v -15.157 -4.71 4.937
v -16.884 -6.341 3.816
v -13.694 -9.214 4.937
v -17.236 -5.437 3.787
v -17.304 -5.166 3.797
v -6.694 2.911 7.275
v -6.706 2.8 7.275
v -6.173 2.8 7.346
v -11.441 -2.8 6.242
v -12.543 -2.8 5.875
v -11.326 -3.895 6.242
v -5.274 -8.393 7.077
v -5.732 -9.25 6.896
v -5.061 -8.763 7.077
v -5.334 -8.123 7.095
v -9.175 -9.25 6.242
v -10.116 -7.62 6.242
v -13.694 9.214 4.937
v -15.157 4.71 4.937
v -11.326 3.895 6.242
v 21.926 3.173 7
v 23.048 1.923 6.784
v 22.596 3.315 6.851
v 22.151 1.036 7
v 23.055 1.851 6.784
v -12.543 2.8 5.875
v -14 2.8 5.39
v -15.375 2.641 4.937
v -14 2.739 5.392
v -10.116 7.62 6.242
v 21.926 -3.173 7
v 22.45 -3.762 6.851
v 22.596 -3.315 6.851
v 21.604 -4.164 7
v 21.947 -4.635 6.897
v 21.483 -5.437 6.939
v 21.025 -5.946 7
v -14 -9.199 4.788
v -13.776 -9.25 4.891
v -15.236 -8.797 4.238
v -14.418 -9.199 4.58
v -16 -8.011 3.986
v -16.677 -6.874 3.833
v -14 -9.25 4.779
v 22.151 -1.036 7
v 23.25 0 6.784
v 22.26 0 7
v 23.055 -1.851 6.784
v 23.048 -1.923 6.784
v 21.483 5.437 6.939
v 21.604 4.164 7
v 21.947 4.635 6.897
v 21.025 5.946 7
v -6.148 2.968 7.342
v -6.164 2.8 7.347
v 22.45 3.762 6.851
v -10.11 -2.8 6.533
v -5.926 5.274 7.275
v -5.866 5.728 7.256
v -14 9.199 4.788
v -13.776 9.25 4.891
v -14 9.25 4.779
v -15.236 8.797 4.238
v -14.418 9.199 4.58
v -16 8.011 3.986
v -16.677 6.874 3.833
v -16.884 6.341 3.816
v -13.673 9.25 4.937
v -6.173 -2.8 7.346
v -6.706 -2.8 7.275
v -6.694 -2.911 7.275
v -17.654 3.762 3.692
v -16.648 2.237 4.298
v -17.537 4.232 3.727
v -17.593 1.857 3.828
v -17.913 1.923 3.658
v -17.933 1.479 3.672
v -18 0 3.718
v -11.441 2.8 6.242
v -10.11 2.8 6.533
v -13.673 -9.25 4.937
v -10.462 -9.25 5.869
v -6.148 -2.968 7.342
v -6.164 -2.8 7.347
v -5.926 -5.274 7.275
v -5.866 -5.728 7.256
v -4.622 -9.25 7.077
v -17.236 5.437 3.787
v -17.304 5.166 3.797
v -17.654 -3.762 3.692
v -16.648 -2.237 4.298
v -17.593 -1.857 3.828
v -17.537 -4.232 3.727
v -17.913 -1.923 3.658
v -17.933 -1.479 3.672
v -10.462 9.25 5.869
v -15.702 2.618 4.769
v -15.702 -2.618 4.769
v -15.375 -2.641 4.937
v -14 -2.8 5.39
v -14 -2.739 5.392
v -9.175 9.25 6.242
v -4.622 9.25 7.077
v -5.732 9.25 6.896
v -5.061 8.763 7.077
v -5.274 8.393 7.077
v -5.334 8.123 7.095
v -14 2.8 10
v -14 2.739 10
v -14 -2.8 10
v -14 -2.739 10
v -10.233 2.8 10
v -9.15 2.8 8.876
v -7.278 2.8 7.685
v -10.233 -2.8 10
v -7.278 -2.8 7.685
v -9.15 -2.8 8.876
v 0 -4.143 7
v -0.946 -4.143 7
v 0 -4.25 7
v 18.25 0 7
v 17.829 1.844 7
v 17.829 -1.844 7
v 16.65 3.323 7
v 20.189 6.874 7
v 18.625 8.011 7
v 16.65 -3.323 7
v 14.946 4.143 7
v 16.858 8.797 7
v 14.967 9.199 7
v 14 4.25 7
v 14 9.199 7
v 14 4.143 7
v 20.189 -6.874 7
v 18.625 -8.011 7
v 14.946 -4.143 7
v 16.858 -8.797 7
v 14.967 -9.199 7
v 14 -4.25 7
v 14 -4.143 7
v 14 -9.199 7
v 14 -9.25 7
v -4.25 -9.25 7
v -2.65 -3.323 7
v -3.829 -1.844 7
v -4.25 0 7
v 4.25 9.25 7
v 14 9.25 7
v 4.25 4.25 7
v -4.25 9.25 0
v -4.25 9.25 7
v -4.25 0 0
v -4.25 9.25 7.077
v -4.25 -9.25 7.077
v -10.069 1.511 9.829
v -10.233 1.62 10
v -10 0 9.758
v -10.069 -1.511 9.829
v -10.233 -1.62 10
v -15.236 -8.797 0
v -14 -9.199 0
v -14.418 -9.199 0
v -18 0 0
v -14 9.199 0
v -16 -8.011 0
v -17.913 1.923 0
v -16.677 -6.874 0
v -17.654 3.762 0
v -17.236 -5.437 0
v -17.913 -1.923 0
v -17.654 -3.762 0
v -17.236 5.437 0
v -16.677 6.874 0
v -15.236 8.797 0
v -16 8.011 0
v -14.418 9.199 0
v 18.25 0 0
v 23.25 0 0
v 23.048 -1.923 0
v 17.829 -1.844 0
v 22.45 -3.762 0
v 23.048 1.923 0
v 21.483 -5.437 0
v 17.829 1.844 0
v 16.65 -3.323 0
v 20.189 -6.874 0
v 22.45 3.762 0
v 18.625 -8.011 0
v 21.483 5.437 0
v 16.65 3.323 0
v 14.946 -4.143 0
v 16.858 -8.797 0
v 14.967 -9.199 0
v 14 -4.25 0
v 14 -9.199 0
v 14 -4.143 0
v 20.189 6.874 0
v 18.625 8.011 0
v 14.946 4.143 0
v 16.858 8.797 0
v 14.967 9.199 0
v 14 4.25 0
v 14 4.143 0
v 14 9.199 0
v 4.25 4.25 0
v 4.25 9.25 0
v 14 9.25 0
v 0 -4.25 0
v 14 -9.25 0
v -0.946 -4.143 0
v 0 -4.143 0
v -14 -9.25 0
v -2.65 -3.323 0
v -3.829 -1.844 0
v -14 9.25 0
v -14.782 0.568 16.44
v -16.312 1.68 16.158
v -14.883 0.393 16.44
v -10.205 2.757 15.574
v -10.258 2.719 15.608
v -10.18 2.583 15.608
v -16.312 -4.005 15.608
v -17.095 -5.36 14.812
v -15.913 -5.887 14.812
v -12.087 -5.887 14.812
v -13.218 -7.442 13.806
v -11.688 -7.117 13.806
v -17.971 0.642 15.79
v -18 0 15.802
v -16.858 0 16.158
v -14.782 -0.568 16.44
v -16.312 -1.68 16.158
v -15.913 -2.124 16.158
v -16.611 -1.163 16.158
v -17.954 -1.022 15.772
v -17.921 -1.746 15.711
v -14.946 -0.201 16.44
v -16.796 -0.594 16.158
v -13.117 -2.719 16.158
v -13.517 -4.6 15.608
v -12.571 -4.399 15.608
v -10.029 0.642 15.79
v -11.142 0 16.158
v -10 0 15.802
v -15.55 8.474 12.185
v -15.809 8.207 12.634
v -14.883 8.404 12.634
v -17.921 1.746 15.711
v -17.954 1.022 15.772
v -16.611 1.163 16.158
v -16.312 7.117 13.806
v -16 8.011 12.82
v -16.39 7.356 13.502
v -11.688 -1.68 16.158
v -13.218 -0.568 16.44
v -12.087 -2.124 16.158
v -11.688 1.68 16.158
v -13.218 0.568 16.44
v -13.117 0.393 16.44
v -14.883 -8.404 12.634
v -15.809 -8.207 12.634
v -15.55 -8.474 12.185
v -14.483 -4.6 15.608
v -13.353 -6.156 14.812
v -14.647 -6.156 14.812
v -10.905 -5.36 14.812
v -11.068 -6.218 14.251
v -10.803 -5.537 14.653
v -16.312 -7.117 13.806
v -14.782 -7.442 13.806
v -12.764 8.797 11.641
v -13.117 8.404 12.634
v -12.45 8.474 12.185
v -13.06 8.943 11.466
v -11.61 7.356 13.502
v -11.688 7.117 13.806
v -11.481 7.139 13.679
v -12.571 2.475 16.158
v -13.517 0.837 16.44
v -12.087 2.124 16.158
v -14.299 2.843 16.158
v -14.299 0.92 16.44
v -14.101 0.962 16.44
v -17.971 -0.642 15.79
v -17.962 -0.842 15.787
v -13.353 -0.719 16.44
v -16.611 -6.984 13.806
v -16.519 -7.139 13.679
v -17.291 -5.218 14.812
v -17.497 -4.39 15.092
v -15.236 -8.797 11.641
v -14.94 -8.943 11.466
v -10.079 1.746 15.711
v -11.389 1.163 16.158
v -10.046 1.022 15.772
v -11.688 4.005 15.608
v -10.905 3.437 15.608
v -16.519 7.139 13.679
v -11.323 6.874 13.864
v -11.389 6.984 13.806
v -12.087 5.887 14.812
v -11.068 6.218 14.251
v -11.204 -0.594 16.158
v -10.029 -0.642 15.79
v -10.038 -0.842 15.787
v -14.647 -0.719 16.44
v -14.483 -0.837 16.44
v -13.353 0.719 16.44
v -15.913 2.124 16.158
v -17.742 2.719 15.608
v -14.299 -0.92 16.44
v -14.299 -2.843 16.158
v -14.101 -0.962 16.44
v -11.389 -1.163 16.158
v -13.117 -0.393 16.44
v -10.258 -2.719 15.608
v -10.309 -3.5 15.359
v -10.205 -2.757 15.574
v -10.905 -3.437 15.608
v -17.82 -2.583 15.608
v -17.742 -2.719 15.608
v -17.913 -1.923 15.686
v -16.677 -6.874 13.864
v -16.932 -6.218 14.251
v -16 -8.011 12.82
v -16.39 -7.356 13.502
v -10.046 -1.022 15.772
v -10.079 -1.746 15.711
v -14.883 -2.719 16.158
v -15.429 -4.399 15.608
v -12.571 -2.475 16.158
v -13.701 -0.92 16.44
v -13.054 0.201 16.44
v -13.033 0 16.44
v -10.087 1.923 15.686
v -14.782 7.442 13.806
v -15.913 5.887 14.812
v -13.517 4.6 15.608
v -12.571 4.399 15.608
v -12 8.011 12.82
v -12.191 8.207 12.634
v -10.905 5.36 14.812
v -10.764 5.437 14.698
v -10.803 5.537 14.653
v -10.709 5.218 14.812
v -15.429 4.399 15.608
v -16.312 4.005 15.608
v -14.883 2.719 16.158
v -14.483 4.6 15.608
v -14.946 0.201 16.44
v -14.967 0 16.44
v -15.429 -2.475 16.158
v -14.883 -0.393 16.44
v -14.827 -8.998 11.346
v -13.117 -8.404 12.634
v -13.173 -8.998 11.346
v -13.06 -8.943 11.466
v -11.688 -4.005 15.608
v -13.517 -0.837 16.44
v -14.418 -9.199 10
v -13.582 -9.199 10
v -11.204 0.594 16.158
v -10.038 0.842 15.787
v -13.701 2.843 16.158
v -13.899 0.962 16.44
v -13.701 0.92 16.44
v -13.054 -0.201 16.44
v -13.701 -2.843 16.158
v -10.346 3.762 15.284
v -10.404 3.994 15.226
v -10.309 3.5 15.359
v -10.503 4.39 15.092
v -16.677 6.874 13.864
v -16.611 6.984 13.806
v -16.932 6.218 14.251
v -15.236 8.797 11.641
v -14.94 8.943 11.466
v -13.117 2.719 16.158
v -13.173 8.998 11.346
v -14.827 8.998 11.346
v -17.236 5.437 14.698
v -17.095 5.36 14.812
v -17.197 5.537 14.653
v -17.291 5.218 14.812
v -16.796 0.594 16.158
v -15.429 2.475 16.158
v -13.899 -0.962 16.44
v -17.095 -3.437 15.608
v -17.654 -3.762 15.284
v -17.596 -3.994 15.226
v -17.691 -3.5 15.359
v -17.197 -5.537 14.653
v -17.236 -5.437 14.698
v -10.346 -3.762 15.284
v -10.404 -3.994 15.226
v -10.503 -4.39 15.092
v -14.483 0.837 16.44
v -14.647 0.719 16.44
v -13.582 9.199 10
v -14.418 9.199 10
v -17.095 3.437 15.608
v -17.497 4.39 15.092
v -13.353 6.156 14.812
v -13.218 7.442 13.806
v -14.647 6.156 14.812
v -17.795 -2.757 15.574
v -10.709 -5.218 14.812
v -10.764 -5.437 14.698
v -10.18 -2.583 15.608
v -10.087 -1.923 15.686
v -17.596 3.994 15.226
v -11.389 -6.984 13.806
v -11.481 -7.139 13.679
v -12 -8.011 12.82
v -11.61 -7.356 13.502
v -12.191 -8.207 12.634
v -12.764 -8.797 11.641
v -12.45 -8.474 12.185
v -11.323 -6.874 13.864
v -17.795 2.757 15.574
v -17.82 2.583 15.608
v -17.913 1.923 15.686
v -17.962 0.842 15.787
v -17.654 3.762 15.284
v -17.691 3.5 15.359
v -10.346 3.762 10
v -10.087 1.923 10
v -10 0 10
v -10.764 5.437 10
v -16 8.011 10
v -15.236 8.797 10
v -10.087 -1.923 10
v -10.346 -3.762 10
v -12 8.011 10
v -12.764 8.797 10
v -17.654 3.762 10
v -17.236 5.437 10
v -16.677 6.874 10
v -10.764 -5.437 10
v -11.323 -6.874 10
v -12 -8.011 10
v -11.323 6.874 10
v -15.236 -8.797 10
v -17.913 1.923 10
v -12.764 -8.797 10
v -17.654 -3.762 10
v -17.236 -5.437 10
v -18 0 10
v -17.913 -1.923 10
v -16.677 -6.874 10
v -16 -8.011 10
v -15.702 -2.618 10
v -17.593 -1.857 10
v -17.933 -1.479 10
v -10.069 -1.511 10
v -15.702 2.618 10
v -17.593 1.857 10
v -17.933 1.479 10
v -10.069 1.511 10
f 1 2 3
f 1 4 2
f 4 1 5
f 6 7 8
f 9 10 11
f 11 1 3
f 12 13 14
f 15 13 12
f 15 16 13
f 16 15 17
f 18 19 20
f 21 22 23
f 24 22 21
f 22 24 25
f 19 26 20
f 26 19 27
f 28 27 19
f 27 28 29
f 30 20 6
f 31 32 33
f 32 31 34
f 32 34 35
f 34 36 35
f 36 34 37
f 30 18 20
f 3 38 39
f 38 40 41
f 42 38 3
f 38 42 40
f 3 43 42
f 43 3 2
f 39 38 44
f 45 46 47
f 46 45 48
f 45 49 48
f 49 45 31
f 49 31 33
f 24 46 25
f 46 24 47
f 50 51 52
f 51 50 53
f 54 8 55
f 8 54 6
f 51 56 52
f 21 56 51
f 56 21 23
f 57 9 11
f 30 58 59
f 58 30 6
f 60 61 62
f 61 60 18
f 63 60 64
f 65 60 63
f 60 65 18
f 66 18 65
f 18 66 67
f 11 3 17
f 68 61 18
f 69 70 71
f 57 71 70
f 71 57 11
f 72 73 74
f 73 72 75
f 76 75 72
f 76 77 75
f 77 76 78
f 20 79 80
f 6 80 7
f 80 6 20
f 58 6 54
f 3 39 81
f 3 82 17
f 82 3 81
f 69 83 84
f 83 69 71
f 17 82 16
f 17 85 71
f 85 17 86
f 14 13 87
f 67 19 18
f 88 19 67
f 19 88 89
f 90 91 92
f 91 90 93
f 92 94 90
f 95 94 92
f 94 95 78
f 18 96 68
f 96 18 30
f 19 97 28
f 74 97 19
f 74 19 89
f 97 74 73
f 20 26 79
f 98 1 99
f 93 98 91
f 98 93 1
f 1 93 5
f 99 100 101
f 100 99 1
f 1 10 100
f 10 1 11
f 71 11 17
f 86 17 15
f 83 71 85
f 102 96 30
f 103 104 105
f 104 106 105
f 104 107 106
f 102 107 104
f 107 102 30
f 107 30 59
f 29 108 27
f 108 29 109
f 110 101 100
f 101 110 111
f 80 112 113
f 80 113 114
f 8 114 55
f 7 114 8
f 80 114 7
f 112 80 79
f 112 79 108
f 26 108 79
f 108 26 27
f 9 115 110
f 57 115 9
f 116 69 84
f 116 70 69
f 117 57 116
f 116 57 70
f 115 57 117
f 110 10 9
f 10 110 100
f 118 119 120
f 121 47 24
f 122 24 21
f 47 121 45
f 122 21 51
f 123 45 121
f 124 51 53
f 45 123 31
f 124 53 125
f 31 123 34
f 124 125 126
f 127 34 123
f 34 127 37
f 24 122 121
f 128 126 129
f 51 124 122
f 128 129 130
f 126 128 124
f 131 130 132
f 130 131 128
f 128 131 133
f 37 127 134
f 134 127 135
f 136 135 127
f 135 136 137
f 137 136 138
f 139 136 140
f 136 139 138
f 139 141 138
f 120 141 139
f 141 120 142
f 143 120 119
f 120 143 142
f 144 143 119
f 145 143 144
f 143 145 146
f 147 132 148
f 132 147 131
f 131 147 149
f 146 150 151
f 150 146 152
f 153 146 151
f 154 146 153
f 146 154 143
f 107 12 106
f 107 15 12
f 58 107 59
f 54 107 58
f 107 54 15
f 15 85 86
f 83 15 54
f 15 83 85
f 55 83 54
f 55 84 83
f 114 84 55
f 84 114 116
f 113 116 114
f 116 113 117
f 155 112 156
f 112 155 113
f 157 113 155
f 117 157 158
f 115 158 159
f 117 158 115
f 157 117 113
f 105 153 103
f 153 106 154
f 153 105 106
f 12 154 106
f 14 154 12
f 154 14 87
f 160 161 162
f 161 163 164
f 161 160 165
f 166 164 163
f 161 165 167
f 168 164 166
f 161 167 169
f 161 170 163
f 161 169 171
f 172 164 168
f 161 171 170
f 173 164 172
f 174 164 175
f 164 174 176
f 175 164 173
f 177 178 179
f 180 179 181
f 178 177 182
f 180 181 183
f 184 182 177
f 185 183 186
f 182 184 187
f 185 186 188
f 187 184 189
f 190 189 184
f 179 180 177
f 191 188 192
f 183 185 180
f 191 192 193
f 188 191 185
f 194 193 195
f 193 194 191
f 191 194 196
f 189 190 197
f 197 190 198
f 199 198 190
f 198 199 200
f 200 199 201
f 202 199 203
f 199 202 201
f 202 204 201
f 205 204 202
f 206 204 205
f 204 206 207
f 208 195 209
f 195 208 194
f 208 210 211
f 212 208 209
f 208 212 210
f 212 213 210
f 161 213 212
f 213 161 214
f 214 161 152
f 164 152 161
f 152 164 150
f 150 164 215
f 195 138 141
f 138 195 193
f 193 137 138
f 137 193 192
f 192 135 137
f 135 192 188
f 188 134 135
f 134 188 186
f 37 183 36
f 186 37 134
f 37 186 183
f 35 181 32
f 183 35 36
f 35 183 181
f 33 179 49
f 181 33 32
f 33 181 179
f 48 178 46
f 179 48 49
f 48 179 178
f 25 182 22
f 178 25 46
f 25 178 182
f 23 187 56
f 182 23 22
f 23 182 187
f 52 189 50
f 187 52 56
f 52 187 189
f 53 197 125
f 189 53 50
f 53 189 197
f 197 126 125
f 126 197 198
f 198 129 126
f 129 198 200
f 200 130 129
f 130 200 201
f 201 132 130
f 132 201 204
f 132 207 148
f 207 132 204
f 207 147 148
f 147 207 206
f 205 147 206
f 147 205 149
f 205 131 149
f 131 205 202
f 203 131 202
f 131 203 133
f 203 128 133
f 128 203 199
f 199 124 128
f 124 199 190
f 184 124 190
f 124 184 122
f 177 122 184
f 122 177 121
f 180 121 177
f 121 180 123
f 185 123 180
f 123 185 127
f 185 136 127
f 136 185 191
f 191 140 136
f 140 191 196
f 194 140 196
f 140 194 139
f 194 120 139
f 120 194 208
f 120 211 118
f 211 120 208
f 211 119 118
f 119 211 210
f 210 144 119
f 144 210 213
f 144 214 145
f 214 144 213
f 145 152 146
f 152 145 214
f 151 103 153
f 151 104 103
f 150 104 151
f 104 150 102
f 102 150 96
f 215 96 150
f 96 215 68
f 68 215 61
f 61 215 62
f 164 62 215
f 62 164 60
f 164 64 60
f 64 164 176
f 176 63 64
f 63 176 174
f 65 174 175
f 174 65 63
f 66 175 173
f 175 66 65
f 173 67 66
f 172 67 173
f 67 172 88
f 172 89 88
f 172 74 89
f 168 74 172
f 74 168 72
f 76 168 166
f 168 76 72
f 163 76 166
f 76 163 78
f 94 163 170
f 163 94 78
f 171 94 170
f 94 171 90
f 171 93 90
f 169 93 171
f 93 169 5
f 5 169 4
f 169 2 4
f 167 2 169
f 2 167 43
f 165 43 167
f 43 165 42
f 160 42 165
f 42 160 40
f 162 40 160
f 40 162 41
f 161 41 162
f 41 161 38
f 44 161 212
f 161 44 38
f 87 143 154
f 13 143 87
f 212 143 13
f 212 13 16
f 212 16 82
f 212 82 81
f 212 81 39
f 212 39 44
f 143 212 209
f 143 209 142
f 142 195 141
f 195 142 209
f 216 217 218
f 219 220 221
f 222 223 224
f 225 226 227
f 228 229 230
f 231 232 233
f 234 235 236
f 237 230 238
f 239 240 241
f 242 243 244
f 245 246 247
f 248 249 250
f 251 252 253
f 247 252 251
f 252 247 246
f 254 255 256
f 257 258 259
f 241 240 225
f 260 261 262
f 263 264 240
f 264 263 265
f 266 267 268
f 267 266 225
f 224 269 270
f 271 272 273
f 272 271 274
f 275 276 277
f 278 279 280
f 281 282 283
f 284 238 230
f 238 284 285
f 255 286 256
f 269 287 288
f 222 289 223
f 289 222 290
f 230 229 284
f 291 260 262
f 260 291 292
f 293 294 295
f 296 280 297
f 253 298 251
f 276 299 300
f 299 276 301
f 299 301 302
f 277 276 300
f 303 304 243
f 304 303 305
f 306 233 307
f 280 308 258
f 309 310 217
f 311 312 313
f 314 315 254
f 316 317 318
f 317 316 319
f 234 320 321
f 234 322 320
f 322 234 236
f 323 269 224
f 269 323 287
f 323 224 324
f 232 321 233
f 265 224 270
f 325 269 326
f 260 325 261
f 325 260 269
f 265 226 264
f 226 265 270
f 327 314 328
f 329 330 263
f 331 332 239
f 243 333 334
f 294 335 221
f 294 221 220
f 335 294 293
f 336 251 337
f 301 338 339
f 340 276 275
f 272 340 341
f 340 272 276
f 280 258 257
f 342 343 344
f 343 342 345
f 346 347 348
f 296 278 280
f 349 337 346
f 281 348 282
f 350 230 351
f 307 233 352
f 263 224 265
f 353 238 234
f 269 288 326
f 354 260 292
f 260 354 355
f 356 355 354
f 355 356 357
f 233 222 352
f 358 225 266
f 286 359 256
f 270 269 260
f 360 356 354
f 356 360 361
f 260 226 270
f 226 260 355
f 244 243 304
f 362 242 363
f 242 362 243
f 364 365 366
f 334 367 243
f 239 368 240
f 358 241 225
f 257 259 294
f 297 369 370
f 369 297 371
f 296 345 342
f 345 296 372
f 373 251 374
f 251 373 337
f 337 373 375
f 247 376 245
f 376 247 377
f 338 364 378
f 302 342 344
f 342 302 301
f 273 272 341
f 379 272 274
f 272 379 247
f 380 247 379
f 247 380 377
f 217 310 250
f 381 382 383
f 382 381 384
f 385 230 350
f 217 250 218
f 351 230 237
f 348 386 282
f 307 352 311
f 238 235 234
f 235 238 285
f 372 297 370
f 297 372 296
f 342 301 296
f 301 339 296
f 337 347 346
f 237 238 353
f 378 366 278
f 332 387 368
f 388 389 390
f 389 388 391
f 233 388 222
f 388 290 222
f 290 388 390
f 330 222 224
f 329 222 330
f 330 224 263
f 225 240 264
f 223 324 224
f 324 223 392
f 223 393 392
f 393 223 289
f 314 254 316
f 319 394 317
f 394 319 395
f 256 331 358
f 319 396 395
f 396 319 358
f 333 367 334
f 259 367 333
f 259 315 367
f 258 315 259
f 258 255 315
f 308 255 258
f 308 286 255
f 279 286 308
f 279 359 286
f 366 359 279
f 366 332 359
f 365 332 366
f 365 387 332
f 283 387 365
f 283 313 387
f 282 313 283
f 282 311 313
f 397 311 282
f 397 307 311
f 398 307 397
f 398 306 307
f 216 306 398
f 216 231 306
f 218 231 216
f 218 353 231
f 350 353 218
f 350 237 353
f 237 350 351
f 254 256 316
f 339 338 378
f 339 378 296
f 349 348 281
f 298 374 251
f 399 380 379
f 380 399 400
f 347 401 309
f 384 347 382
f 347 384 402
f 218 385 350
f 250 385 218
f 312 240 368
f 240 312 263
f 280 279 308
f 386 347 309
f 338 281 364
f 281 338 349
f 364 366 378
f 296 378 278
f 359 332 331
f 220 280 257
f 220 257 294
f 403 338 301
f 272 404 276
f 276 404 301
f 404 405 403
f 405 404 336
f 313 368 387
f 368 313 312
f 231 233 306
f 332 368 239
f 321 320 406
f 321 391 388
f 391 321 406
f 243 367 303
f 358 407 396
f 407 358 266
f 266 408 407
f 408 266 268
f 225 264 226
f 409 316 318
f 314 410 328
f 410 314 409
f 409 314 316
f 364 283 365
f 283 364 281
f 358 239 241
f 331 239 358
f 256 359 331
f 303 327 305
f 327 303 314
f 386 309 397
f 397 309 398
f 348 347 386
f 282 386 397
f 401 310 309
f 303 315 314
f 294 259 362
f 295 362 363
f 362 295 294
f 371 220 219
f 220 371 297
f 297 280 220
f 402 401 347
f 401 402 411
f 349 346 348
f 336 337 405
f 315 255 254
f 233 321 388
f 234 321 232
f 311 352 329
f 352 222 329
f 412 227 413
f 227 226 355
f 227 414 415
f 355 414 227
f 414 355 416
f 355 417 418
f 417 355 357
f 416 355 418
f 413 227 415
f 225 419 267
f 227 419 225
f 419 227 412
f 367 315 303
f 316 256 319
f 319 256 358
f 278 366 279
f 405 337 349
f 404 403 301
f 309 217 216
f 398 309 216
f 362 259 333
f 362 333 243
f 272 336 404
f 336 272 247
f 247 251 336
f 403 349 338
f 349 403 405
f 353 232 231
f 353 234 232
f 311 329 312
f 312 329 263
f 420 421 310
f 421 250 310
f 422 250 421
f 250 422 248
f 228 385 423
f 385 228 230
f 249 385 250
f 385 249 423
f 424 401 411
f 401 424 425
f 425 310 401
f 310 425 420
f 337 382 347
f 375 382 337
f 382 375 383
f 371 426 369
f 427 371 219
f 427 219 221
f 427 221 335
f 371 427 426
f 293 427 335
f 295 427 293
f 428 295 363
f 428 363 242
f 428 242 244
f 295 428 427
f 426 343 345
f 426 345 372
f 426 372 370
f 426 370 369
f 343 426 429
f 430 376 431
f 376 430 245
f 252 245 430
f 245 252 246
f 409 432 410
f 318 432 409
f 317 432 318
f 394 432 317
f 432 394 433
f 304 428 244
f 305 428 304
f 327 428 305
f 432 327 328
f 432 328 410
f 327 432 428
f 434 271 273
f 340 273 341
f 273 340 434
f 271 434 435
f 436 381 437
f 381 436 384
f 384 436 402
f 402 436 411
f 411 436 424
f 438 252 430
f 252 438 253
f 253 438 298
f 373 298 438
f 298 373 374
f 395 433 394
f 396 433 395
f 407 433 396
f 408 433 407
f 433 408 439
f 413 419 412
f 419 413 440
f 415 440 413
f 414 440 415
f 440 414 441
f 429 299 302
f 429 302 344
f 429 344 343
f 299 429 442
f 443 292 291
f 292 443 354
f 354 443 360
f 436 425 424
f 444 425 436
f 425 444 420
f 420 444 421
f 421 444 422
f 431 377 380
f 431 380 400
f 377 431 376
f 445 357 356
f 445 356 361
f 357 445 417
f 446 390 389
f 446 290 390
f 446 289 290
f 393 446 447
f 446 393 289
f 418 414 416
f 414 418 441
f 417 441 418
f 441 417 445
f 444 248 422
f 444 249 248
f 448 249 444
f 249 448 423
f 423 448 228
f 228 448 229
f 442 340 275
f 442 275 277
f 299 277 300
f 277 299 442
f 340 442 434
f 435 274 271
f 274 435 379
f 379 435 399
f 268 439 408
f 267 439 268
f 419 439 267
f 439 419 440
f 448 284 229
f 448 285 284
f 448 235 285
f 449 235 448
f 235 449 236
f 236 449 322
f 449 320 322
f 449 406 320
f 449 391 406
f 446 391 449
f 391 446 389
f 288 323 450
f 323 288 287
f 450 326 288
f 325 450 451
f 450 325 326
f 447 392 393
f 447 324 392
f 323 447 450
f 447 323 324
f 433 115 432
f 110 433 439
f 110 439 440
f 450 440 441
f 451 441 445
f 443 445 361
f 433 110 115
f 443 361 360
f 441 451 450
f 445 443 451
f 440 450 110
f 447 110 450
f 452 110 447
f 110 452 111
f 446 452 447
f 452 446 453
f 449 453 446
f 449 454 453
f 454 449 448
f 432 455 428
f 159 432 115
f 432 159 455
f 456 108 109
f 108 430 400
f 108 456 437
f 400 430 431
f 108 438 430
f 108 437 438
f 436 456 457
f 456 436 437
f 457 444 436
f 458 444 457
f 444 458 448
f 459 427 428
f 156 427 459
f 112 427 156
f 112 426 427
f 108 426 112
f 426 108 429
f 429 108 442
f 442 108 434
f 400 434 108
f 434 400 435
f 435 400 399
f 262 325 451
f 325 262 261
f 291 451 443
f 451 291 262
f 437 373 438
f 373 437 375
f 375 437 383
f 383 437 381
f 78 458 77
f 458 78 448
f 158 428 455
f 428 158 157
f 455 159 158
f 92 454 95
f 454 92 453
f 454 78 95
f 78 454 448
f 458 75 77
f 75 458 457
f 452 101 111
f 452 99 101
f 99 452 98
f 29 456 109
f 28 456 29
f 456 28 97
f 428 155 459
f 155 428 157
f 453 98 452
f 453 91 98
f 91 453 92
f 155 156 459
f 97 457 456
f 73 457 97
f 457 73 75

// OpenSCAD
//
//  Copyright (C) 01-08-2013 Jasper den Ouden.
//
//  This is free software: you can redistribute it and/or modify
//  it under the terms of the GNU General Public License as published
//  by the Free Software Foundation, either version 3 of the License, or
//  (at your option) any later version.
//

//One end goes into the hole and the other around the peg that usually is
// used with the hole. Now the two are held together at a different distance.

r = 8.5/2;
t=5;

sl = 8;
l=28;
w= 2*(r+t);

h = 7;
ch = 3;

module profile()
{
    difference()
    {
        union()
        {   square([l,w],center=true);
            translate([l/2,0]) circle(r+t);
            translate([-l/2,0]) scale([sl/(2*(r+t)),1]) circle(r+t);
        }
        translate([l/4,0]) square([l/2,2*r],center=true);
        translate([0,w]) square([2*r,2*w],center=true);
        circle(r);
        
        translate([l/2,0]) circle(r);
    }
}

module pants_holder()
{
    union()
    {   intersection()
        {   linear_extrude(height=2*h) profile();
            difference()
            {   union()
                {   translate([l/4,0]) scale([1,1,0.3]) sphere(l);
                    cube([l,sl*0.7,3*h],center=true);
                }
                translate([l-r,0,h+l]) cube(l*[2,2,2],center=true);
                translate([-r,w,h+l/2]) rotate([90,0,0]) scale([0.7,1,1]) 
                    cylinder(r=l/2,h=3*w);
            }
        }
        translate([-l/2,0]) linear_extrude(height=h+ch) intersection()
        {   scale([1.2,0.7]) circle(sl/2);
            scale([sl/(2*(r+t)),1]) circle(r+t);
        }
        translate([-l/2,0,h+ch]) intersection()
        {   scale([1,1,0.7]) sphere(r+t);
            scale([sl/(2*(r+t)),1]) cylinder(r=r+t,h=h);
        }
    }
}

pants_holder();
